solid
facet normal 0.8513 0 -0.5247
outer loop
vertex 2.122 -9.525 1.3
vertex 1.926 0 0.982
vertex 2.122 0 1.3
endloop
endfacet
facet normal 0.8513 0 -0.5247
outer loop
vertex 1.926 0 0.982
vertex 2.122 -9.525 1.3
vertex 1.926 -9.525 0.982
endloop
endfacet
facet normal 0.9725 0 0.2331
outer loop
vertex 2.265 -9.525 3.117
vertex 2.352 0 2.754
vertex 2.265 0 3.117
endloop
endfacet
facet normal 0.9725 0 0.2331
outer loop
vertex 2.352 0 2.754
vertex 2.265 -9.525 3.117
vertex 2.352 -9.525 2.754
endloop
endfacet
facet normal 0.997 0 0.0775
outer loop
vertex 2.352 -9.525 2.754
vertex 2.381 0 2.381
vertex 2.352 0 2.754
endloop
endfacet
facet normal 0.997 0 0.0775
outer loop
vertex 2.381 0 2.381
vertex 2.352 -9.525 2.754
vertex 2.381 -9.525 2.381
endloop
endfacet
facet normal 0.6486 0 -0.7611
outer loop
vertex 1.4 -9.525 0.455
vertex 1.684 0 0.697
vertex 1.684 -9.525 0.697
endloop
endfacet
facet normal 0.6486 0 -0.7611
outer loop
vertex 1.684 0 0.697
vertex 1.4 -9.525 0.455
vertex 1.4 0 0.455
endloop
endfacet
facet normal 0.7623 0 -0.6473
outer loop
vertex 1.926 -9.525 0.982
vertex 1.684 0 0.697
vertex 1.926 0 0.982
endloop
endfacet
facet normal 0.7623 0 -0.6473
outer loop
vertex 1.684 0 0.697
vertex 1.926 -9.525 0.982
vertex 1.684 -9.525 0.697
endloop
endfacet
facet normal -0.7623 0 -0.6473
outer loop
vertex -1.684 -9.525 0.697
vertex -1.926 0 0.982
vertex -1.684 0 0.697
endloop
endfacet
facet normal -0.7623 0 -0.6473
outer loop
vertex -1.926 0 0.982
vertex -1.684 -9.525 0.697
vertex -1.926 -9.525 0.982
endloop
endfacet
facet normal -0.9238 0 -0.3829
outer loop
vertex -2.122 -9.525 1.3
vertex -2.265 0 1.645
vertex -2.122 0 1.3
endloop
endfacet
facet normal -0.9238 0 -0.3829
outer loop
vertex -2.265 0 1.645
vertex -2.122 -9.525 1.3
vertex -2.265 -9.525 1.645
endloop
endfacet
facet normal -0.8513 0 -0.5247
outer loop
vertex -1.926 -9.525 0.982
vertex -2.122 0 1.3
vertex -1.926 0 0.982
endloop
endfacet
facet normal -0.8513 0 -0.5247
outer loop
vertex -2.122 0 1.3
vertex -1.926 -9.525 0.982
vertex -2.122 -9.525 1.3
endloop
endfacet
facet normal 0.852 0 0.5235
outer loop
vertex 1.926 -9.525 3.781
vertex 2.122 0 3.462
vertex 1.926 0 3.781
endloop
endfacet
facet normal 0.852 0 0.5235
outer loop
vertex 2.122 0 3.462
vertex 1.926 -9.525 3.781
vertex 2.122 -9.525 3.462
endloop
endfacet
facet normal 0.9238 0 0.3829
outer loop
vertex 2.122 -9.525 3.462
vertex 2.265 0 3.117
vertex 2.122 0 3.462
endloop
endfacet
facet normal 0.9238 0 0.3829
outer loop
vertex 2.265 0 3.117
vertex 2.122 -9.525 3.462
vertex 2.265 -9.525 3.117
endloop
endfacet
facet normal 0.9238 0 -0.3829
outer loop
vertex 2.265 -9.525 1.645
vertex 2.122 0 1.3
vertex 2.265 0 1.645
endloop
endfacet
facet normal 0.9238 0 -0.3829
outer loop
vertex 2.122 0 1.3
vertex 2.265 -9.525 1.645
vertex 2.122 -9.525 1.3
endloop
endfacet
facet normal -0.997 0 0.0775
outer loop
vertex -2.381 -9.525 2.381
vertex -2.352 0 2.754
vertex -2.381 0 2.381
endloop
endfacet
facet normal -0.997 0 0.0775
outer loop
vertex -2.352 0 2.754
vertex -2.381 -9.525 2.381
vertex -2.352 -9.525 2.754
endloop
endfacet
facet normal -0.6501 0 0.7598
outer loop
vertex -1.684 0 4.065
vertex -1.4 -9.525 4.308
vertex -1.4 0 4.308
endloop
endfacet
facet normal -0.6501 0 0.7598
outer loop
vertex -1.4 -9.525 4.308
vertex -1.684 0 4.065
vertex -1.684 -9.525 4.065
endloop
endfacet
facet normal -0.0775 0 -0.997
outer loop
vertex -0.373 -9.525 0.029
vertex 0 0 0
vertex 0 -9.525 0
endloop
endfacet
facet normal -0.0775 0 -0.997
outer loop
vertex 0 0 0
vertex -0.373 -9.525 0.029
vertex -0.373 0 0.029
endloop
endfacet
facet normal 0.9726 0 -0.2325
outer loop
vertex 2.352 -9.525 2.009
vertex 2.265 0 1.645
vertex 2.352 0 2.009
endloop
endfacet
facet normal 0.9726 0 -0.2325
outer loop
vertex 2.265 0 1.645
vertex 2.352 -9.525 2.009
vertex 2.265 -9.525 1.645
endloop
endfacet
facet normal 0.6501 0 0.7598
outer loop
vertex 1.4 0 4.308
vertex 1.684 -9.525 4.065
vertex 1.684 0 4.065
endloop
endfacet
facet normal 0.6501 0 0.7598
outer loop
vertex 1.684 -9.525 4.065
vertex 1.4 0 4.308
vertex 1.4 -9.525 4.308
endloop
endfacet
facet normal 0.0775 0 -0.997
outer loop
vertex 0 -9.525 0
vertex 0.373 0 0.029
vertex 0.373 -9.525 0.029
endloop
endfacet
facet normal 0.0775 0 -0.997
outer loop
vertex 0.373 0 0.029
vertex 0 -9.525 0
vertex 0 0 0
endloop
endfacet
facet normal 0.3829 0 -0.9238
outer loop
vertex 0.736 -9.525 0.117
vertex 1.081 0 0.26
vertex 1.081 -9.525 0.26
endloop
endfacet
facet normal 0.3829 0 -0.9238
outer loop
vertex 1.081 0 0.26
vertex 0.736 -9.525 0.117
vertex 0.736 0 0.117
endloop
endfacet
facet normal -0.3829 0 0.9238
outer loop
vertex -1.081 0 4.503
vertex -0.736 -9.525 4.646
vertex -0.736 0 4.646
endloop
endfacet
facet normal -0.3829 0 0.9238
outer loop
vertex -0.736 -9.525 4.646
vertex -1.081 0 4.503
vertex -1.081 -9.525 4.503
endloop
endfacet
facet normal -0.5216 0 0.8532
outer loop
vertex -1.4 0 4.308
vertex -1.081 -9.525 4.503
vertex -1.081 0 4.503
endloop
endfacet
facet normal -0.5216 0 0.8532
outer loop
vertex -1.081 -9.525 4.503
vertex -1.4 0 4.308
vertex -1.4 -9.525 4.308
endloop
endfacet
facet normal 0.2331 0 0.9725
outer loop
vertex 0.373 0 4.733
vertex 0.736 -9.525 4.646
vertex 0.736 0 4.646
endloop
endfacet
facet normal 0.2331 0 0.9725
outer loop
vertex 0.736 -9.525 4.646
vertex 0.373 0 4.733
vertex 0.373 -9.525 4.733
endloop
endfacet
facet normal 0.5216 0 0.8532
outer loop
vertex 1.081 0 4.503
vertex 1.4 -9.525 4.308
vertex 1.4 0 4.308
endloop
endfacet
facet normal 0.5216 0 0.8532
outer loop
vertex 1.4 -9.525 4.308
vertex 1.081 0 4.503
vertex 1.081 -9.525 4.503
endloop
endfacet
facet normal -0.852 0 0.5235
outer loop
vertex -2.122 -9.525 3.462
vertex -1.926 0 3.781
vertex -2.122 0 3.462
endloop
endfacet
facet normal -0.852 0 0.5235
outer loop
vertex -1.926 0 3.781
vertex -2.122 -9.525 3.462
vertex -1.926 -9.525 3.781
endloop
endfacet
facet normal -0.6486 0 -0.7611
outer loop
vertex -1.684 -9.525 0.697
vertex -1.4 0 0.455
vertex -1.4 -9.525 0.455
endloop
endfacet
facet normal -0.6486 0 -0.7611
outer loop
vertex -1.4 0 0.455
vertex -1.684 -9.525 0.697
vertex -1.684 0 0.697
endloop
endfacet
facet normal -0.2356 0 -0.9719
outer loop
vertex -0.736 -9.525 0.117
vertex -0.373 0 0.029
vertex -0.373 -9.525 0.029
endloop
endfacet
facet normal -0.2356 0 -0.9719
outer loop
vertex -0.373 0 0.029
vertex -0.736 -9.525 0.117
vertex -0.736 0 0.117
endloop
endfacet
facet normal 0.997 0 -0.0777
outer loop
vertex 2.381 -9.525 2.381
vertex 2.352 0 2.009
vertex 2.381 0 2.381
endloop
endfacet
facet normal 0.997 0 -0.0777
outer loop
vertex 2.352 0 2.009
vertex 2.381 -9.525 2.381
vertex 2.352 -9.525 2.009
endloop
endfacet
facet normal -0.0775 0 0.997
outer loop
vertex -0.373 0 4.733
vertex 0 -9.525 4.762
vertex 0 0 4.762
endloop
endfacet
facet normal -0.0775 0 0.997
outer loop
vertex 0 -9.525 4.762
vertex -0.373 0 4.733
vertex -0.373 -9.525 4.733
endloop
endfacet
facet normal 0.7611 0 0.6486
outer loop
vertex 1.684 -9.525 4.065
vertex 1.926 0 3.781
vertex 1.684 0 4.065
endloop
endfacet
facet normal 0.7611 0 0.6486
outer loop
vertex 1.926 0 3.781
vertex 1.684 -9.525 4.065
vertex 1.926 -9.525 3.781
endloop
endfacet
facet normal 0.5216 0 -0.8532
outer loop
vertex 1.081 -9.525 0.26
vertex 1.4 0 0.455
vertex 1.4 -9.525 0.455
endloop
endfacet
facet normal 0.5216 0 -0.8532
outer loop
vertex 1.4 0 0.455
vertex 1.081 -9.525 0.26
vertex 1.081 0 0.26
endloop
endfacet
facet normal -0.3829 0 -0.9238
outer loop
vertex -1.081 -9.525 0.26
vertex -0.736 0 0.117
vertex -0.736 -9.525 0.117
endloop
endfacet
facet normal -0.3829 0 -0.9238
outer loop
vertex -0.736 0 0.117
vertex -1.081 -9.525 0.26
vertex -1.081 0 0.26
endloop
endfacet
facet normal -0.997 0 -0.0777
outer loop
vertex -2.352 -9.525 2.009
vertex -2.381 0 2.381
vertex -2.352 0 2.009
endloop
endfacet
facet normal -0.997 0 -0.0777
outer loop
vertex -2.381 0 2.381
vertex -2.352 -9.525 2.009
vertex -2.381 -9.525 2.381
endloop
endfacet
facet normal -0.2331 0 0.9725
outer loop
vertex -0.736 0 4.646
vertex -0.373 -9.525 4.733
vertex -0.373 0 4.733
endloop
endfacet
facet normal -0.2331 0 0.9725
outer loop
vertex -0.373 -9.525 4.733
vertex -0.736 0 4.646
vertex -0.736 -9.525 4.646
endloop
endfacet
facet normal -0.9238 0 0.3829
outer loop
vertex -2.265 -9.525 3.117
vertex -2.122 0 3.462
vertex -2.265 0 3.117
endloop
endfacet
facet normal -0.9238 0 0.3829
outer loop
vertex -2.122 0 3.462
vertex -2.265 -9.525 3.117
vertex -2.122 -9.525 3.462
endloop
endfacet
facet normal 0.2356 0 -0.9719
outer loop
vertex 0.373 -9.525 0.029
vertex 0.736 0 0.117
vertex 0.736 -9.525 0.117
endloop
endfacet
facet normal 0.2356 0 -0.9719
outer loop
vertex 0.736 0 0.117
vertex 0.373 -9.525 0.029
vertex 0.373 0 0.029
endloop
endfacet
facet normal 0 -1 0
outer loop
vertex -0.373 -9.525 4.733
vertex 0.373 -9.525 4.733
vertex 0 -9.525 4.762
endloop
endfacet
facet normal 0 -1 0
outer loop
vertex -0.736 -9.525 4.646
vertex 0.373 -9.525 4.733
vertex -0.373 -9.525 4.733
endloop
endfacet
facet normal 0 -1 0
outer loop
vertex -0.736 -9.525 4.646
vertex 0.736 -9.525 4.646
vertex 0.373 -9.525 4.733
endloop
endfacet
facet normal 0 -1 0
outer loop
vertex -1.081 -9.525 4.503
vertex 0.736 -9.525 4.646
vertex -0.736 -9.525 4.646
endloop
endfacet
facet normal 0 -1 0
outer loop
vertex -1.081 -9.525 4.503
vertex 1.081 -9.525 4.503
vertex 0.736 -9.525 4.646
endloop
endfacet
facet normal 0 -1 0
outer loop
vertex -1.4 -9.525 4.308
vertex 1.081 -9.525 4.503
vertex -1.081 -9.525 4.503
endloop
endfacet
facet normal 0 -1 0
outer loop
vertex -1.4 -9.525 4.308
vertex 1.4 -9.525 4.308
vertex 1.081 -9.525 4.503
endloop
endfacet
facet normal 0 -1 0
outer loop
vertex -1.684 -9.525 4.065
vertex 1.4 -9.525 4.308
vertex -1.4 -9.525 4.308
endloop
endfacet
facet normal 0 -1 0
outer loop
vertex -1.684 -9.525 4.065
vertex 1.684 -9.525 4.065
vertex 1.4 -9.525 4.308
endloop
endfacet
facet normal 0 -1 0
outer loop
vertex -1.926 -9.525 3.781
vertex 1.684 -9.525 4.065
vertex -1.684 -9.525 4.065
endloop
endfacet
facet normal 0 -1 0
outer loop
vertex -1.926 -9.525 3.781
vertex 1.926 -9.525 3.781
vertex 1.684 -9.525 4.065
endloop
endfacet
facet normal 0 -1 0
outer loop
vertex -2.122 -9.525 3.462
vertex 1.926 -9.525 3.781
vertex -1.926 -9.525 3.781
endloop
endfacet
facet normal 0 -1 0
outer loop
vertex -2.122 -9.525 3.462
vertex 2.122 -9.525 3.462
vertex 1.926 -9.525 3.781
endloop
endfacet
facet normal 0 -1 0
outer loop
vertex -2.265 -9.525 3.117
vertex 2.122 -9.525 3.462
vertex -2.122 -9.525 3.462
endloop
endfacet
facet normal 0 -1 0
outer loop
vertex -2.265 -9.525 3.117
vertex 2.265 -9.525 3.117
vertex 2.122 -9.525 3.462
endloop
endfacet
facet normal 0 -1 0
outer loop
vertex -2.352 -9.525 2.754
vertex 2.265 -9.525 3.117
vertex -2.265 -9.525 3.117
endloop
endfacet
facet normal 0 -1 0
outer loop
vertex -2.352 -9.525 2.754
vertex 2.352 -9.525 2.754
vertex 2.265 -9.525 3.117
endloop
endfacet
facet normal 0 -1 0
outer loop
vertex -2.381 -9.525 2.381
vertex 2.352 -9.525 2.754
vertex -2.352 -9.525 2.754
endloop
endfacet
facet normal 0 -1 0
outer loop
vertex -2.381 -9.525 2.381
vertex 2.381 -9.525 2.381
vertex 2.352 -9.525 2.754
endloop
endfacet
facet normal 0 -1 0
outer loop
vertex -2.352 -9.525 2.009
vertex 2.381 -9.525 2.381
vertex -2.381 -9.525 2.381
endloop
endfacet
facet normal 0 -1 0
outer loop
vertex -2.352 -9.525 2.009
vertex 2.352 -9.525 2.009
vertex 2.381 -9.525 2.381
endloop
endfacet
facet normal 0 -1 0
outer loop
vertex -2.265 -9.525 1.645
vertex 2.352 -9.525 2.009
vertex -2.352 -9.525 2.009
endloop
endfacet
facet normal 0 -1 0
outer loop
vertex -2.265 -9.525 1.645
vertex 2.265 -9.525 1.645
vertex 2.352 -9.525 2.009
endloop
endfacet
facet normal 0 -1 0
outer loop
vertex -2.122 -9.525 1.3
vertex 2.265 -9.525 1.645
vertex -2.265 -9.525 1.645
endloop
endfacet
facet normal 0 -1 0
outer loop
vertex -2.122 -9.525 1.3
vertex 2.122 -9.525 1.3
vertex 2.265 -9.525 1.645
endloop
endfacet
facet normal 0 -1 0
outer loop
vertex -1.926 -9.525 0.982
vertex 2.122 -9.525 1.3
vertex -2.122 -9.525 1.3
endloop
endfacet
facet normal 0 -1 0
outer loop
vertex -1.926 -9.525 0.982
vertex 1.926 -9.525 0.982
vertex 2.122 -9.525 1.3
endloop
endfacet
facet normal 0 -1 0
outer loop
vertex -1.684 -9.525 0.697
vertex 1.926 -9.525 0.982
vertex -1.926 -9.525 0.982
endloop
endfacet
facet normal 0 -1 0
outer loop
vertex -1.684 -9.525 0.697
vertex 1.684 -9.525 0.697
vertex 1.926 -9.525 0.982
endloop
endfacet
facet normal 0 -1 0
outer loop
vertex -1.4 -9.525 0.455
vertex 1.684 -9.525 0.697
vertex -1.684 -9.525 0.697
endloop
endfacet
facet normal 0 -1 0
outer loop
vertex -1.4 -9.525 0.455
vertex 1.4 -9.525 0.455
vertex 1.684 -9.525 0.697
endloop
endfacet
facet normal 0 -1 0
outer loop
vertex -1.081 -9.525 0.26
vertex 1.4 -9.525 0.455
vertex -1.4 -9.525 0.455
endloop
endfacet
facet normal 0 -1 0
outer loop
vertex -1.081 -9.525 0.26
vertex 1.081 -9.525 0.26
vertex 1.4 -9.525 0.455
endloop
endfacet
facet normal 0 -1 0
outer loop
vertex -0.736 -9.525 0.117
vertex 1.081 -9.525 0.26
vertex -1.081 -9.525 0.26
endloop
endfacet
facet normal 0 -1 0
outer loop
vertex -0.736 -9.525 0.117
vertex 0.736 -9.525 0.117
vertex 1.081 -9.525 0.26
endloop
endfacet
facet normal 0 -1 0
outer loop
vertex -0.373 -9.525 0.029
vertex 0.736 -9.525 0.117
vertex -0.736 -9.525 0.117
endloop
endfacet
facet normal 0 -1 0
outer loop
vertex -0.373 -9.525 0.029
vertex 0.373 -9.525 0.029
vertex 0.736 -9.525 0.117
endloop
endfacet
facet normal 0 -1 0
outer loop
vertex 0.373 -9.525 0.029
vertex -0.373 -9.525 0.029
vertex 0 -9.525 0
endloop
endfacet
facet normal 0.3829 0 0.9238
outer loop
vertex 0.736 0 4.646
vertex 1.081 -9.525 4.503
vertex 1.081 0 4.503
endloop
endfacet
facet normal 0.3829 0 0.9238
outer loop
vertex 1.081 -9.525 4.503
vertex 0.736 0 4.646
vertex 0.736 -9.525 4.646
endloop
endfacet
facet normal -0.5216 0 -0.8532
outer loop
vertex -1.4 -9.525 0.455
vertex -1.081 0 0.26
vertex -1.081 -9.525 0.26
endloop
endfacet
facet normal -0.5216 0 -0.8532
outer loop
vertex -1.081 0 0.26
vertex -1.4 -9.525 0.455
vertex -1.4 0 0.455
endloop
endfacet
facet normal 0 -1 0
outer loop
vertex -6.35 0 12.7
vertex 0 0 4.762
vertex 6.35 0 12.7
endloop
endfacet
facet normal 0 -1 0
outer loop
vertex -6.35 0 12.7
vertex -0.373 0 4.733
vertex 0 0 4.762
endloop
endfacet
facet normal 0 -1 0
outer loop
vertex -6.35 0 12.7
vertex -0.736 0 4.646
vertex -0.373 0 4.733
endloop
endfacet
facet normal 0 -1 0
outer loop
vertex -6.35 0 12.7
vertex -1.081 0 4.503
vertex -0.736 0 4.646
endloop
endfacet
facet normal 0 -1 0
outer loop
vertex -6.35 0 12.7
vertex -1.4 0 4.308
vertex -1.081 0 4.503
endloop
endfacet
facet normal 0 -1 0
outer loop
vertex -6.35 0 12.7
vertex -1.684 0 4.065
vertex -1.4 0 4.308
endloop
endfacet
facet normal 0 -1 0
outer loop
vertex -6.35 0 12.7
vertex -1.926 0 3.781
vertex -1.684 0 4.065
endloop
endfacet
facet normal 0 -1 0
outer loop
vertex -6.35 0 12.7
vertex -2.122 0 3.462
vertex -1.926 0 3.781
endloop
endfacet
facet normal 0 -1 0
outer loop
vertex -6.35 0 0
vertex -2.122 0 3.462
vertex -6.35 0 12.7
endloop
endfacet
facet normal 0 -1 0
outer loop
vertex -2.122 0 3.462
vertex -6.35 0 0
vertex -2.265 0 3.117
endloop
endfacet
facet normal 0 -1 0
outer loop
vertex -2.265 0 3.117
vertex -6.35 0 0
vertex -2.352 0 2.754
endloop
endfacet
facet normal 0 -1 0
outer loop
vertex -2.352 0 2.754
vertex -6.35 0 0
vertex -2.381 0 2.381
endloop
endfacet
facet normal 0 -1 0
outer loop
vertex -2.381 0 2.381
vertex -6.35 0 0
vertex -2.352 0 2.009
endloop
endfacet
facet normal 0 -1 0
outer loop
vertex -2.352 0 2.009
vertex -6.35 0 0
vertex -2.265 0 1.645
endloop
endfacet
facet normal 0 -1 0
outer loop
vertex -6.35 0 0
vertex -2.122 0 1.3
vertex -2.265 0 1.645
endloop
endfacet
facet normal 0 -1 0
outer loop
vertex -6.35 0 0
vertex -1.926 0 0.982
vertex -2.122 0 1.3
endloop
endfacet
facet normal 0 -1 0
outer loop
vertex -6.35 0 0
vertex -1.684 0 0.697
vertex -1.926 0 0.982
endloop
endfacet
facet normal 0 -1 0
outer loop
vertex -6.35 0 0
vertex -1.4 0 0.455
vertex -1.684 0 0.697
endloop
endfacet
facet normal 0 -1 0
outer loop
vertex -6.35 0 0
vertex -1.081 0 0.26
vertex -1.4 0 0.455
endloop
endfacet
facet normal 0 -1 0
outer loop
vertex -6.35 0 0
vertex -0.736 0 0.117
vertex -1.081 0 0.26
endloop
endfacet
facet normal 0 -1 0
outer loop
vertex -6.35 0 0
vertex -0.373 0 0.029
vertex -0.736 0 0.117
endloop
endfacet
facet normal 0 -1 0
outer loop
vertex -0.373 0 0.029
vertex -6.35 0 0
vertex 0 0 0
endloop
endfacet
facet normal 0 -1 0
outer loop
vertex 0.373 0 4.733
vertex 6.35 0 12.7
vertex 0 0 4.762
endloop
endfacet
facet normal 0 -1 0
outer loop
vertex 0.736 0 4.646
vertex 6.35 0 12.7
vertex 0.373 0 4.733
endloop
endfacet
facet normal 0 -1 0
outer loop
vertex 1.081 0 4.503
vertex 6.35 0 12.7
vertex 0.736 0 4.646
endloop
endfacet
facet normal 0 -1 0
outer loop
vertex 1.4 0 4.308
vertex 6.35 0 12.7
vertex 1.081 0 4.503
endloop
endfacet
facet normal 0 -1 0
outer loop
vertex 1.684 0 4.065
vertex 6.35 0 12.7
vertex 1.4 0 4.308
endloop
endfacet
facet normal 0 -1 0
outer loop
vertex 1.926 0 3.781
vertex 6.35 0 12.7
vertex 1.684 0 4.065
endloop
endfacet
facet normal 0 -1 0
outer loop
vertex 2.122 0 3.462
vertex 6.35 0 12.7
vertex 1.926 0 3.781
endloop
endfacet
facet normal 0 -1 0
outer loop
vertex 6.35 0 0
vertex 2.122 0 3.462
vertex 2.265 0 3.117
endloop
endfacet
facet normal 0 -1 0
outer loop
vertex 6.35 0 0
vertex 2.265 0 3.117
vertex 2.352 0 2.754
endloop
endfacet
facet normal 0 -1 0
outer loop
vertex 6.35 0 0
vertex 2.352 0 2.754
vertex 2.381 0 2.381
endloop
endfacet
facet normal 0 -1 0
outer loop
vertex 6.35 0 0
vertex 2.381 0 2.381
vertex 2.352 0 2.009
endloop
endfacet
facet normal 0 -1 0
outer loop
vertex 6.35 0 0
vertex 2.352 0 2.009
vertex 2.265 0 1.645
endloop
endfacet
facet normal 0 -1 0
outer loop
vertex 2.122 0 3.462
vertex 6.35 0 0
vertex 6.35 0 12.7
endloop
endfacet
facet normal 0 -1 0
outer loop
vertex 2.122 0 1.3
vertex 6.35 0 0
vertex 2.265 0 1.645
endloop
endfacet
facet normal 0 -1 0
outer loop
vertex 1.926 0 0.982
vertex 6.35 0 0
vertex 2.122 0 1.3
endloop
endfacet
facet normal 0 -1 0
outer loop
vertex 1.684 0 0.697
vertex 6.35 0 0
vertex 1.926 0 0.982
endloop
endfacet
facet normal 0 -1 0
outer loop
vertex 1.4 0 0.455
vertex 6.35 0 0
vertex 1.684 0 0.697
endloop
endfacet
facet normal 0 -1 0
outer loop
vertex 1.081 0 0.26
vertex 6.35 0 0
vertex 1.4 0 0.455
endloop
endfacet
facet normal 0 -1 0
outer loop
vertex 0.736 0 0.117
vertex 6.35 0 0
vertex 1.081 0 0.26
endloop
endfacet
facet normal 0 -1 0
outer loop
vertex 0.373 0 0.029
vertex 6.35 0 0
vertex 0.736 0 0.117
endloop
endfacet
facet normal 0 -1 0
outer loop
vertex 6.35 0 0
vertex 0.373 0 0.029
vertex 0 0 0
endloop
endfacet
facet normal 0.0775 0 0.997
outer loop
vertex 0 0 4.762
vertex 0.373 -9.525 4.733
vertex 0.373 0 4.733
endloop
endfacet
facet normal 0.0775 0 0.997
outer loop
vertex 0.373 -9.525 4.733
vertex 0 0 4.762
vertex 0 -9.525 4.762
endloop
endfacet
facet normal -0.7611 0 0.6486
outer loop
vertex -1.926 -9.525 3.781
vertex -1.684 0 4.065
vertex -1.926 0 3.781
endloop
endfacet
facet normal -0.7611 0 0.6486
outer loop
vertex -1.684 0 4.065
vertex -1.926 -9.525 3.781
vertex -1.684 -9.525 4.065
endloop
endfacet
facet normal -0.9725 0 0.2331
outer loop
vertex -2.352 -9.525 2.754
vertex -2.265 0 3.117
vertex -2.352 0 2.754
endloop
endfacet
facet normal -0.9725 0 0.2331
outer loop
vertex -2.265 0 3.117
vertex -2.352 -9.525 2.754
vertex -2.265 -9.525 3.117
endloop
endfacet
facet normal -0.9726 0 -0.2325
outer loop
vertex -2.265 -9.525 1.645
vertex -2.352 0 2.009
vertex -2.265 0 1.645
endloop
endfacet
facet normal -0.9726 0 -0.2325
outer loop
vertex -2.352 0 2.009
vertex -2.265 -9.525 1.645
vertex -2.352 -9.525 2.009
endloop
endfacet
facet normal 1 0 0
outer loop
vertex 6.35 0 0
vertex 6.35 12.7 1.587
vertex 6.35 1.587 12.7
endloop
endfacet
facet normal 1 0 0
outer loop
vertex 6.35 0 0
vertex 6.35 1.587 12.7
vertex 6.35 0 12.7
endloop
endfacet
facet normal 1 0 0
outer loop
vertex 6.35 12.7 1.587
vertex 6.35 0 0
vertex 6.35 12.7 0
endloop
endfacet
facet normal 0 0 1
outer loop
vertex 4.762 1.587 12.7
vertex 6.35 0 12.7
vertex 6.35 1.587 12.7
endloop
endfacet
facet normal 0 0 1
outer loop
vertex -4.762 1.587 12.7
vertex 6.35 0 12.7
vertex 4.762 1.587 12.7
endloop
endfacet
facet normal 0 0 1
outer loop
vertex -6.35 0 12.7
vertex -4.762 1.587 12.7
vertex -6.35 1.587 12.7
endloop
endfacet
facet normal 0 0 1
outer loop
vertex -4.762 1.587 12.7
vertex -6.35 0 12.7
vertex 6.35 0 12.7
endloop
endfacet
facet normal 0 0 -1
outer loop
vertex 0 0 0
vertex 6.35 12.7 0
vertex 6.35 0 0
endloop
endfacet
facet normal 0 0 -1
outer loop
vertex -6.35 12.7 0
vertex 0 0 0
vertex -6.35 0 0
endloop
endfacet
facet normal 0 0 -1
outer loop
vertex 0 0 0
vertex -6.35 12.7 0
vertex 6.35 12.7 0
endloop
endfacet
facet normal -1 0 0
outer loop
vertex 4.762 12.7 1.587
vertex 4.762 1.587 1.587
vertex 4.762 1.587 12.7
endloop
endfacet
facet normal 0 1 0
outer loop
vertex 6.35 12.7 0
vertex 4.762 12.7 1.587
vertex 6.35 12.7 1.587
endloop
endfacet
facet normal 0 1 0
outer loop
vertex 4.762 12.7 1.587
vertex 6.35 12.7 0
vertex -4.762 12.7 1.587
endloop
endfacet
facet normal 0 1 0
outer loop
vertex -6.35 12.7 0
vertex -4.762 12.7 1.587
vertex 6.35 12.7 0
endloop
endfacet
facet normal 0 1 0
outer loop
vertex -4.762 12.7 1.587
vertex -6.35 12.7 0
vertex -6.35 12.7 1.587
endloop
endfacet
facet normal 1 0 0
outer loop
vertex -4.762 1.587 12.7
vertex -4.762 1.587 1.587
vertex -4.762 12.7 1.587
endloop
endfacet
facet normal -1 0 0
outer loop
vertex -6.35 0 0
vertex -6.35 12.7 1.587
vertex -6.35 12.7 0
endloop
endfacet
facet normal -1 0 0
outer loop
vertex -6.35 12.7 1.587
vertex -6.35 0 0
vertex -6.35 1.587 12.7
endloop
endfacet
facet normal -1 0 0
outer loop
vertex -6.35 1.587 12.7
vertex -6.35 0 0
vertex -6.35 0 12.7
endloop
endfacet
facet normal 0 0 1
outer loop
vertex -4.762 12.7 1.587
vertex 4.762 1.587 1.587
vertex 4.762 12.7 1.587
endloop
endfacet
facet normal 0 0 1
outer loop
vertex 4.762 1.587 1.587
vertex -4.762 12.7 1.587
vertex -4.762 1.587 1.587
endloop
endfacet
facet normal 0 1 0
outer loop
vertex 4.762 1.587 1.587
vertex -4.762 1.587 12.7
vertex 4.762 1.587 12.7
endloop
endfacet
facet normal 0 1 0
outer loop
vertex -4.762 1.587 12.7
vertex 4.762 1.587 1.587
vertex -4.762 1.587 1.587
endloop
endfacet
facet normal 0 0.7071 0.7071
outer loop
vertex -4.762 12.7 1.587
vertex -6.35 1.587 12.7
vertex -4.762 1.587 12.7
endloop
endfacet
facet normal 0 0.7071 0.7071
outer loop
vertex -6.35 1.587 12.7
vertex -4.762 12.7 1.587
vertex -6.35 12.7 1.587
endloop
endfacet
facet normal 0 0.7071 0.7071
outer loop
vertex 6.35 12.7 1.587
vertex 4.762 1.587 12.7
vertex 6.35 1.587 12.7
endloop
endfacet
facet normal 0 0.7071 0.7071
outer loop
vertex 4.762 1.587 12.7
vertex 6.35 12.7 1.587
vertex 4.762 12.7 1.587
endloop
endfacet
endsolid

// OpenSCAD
//
// Parameterized Shelf Peg
//
// This part was designed October 2018 by Joe McKeown. 
// It's available under the terms of the Creative Commons CC-BY-NC license 
// (https://creativecommons.org/licenses/by-nc/3.0/).
// 
//
// History:
// V1.0 6 Oct 2018 First Release

/* [Parameters] */
// Units for measurements, Inches or Millimeters
Units="in"; // ["in", "mm" ]
// Diameter of the Peg
Peg_Diameter=0.1875;
// Length of the Peg
Peg_Length=0.375;
// Length of the top, in contact with shelf
Top_Length=0.5;
// Height of the side, in contact wiht cabinet
Side_Height=0.5;
// Width of the clip
Clip_Width=0.5;
// thickness of the clip's walls
Clip_Thick=0.0625;

/* [Hidden] */
MM_PER_INCH=25.4;

pegD=(Units == "mm")?Peg_Diameter:Peg_Diameter*MM_PER_INCH;
pegL=(Units == "mm")?Peg_Length:Peg_Length*MM_PER_INCH;
topL=(Units == "mm")?Top_Length:Top_Length*MM_PER_INCH;
side=(Units == "mm")?Side_Height:Side_Height*MM_PER_INCH;
width=(Units == "mm")?Clip_Width:Clip_Width*MM_PER_INCH;
thick=(Units == "mm")?Clip_Thick:Clip_Thick*MM_PER_INCH;
  
if (Units == "in"){
  pegD=Peg_Diameter*MM_PER_INCH;
  pegL=Peg_Length*MM_PER_INCH;
  topL=Top_Length*MM_PER_INCH;
  side=Side_Height*MM_PER_INCH;
  width=Clip_Width*MM_PER_INCH;
}


hyp=sqrt(side*side + topL*topL);
angle=90-atan( (side-thick)/(topL-thick) );

difference(){
  union(){
    // peg
    translate([0,0,pegD/2])
      rotate([90,0,0])
        cylinder(d=pegD, h=pegL, $fn=40);
    // +x side
    translate([width/2-thick,0,0])
      cube([thick,topL,side]);
    // -x side
    translate([-width/2,0,0])
      cube([thick,topL,side]);
    // top (although the thing is upside down so maybe bottom)
    translate([-width/2,0,0])
      cube([width,topL,thick]);
    // top (although the thing is upside down so maybe bottom)
    translate([-width/2,0,0])
      cube([width,thick,side]);
  }
  translate([0,(topL+thick)/2,(side+thick)/2])
    rotate([angle,0,0])color("red")
      translate([0,hyp/2,0])
        cube([width+2,hyp, hyp], true);
}
